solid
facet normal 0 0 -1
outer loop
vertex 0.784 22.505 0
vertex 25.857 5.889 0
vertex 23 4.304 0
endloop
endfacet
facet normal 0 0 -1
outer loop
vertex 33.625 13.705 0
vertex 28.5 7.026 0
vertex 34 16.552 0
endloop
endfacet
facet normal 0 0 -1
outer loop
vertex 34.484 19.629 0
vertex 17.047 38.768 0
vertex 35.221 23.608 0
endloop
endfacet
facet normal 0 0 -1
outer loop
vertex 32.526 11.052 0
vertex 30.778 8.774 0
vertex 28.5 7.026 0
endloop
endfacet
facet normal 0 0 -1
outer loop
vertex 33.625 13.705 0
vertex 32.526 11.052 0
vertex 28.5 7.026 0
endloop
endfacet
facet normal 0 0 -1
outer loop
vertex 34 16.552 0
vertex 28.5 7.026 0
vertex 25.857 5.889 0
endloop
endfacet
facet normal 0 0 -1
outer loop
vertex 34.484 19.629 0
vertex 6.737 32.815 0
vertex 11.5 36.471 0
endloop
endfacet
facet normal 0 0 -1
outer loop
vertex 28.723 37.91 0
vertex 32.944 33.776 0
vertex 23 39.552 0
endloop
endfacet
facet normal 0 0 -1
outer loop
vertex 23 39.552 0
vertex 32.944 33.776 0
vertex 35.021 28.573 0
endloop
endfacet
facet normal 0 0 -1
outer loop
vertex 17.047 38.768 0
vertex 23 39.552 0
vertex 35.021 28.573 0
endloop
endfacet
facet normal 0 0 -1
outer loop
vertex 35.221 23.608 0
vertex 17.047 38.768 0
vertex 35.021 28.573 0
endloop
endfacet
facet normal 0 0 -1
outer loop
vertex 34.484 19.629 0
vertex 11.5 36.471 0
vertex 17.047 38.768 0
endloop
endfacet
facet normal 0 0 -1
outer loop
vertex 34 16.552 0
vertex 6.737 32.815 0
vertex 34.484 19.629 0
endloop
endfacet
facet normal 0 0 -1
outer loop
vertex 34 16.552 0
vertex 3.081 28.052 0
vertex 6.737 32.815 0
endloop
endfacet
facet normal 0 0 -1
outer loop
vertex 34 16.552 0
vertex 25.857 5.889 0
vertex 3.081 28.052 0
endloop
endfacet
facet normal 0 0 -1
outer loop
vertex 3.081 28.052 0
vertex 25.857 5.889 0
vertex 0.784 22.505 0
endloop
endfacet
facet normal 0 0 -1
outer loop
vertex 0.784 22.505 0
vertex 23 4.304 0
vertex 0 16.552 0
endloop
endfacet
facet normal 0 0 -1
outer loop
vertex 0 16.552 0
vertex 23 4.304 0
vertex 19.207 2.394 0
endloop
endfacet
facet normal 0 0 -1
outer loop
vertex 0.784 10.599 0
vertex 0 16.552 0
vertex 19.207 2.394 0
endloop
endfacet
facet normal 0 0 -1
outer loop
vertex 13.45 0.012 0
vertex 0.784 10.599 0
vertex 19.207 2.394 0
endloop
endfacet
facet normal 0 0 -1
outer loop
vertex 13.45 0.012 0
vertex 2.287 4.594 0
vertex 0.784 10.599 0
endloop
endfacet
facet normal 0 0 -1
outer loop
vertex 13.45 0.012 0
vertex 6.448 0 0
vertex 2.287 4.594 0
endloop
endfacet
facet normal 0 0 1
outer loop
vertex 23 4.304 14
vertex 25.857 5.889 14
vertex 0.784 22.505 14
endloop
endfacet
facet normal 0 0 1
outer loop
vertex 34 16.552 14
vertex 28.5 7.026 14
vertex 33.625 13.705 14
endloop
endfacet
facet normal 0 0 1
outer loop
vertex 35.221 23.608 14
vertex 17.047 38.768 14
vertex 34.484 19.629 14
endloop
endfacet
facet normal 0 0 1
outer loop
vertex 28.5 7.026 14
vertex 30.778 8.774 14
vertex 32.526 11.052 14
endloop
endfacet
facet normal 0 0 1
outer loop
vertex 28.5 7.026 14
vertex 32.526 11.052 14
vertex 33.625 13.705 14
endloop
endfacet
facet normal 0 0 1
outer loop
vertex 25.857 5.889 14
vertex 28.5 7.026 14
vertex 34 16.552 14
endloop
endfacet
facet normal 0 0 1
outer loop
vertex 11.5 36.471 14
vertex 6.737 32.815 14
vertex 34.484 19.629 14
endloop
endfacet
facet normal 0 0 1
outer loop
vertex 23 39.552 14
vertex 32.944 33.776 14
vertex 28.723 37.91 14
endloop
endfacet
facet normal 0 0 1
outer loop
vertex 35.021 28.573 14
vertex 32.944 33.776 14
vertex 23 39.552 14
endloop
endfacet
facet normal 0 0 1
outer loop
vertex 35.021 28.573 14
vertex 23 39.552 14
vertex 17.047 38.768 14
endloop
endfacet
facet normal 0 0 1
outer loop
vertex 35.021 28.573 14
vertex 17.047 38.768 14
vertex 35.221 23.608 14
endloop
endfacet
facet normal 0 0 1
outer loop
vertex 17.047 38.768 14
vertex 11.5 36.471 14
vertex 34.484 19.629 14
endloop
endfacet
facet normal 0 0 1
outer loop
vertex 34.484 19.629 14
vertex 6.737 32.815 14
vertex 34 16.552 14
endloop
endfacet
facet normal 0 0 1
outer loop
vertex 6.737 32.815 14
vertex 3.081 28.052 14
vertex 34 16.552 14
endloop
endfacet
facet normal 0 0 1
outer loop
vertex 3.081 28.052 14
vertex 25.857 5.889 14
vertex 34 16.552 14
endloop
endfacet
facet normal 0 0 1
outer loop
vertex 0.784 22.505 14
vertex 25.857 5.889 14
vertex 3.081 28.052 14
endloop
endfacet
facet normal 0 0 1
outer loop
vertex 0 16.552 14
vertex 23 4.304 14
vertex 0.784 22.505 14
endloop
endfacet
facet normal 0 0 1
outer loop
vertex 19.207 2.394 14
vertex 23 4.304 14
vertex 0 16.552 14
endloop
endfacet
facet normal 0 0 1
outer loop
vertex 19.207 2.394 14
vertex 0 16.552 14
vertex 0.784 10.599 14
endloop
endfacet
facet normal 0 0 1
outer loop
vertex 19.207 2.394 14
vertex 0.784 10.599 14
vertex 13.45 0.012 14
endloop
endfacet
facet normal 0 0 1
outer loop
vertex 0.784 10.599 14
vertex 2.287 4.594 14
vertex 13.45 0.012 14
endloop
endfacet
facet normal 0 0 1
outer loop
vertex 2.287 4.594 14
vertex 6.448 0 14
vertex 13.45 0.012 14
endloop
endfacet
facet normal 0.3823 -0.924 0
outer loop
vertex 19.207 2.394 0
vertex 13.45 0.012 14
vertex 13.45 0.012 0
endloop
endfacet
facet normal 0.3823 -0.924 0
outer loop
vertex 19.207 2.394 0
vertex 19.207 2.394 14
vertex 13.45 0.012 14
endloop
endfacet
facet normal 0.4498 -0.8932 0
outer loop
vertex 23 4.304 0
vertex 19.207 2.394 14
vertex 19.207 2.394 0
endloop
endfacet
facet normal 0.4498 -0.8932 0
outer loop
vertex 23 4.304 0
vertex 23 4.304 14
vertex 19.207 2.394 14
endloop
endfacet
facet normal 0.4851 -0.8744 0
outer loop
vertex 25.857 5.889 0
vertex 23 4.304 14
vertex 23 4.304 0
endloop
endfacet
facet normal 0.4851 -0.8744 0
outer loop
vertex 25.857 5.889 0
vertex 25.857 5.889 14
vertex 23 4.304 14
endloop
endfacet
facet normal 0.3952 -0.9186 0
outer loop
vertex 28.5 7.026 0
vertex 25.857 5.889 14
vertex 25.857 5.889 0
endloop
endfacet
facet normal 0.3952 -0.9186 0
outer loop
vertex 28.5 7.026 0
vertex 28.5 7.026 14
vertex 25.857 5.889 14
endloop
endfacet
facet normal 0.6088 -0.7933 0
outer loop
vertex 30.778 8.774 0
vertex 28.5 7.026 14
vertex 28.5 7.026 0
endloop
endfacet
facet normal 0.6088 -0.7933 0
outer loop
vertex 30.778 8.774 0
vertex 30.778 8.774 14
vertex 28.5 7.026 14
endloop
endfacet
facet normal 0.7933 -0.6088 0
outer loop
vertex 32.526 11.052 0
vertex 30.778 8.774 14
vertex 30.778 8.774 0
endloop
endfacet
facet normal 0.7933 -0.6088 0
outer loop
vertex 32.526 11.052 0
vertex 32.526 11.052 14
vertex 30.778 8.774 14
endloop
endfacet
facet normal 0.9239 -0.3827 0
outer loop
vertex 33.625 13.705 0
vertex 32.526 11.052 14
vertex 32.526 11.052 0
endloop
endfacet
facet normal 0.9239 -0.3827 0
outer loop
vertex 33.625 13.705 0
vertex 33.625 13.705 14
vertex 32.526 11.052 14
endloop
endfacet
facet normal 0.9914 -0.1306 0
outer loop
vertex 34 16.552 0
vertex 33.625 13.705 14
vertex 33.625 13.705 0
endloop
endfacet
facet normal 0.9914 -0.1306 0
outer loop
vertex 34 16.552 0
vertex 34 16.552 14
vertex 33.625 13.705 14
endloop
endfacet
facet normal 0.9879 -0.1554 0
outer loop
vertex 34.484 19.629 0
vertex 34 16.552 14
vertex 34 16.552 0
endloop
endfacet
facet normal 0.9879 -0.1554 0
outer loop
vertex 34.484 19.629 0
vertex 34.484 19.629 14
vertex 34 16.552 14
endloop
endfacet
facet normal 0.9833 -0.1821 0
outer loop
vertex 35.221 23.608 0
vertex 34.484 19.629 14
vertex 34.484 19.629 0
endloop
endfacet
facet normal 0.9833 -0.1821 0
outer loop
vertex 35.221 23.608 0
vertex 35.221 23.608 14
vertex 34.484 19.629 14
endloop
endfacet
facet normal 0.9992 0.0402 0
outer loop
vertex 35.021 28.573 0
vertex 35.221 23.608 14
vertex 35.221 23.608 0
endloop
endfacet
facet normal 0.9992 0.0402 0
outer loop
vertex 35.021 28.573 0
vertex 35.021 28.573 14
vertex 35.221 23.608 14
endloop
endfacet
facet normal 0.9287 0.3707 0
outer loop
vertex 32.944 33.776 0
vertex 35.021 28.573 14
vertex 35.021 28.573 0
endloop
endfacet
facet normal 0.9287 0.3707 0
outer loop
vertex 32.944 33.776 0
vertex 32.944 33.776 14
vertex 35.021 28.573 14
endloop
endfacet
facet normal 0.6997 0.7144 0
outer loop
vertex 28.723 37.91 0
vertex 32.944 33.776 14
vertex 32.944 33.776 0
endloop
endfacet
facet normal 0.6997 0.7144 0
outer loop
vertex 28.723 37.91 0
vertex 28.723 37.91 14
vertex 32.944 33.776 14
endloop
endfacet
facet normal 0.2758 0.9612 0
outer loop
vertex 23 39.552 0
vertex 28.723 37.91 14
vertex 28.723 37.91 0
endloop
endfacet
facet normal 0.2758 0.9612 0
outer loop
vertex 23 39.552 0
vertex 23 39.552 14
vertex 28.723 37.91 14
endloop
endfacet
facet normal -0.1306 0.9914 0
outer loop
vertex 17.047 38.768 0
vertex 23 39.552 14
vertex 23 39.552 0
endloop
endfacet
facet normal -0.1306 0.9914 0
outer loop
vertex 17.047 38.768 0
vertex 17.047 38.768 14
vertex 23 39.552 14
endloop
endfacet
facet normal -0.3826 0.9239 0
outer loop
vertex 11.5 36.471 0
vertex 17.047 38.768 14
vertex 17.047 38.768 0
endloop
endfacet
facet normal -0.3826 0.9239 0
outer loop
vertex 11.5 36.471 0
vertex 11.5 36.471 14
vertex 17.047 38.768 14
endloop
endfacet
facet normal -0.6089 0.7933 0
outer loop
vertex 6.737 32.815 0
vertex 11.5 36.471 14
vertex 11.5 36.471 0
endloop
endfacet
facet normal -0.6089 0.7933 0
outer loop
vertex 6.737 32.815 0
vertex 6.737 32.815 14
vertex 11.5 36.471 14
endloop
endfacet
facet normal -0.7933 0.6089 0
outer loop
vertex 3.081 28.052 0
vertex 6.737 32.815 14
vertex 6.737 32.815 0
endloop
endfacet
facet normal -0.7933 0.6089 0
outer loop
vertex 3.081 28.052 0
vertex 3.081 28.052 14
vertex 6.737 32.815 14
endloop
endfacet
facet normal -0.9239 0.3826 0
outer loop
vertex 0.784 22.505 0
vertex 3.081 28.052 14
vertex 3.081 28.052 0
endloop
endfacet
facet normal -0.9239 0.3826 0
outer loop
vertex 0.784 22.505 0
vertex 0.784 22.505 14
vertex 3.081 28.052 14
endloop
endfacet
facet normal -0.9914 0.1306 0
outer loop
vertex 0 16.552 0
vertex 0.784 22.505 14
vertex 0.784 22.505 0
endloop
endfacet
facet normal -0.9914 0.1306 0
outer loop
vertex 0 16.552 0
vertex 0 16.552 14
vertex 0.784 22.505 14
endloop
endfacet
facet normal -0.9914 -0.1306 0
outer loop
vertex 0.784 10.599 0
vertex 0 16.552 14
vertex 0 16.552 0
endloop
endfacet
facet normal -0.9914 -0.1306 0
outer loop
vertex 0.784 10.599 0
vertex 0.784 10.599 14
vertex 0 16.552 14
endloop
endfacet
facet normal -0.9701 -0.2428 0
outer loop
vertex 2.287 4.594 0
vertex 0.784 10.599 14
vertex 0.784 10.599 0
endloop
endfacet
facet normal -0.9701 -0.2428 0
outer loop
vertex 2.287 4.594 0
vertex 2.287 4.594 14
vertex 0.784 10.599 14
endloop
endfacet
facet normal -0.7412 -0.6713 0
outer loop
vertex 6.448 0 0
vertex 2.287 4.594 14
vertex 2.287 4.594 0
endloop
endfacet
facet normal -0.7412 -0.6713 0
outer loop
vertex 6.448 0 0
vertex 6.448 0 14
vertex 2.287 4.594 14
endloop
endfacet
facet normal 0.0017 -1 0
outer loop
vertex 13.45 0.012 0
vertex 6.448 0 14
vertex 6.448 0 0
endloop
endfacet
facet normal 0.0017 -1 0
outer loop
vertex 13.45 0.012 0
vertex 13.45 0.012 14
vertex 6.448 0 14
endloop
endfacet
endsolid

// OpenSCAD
$fn = 32;

// ----------------------------------------------------------------------
// Cam disc: base radius 11.0 mm, lift 12.0 mm, 24 profile points
// ----------------------------------------------------------------------

// --- parameters (mm) ---
profile_height = 14;      // extrusion height
profile_points = 24;      // points of the closed outline

profile = [[34, 16.552], [34.484, 19.629], [35.221, 23.608], [35.021, 28.573], [32.944, 33.776], [28.723, 37.91], [23, 39.552], [17.047, 38.768], [11.5, 36.471], [6.737, 32.815], [3.081, 28.052], [0.784, 22.505], [0, 16.552], [0.784, 10.599], [2.287, 4.594], [6.448, 0], [13.45, 0.012], [19.207, 2.394], [23, 4.304], [25.857, 5.889], [28.5, 7.026], [30.778, 8.774], [32.526, 11.052], [33.625, 13.705]];  // single closed polygon, 24 points, counter clockwise

// --- the one profile operation ---
linear_extrude(height = profile_height) polygon(points = profile);
